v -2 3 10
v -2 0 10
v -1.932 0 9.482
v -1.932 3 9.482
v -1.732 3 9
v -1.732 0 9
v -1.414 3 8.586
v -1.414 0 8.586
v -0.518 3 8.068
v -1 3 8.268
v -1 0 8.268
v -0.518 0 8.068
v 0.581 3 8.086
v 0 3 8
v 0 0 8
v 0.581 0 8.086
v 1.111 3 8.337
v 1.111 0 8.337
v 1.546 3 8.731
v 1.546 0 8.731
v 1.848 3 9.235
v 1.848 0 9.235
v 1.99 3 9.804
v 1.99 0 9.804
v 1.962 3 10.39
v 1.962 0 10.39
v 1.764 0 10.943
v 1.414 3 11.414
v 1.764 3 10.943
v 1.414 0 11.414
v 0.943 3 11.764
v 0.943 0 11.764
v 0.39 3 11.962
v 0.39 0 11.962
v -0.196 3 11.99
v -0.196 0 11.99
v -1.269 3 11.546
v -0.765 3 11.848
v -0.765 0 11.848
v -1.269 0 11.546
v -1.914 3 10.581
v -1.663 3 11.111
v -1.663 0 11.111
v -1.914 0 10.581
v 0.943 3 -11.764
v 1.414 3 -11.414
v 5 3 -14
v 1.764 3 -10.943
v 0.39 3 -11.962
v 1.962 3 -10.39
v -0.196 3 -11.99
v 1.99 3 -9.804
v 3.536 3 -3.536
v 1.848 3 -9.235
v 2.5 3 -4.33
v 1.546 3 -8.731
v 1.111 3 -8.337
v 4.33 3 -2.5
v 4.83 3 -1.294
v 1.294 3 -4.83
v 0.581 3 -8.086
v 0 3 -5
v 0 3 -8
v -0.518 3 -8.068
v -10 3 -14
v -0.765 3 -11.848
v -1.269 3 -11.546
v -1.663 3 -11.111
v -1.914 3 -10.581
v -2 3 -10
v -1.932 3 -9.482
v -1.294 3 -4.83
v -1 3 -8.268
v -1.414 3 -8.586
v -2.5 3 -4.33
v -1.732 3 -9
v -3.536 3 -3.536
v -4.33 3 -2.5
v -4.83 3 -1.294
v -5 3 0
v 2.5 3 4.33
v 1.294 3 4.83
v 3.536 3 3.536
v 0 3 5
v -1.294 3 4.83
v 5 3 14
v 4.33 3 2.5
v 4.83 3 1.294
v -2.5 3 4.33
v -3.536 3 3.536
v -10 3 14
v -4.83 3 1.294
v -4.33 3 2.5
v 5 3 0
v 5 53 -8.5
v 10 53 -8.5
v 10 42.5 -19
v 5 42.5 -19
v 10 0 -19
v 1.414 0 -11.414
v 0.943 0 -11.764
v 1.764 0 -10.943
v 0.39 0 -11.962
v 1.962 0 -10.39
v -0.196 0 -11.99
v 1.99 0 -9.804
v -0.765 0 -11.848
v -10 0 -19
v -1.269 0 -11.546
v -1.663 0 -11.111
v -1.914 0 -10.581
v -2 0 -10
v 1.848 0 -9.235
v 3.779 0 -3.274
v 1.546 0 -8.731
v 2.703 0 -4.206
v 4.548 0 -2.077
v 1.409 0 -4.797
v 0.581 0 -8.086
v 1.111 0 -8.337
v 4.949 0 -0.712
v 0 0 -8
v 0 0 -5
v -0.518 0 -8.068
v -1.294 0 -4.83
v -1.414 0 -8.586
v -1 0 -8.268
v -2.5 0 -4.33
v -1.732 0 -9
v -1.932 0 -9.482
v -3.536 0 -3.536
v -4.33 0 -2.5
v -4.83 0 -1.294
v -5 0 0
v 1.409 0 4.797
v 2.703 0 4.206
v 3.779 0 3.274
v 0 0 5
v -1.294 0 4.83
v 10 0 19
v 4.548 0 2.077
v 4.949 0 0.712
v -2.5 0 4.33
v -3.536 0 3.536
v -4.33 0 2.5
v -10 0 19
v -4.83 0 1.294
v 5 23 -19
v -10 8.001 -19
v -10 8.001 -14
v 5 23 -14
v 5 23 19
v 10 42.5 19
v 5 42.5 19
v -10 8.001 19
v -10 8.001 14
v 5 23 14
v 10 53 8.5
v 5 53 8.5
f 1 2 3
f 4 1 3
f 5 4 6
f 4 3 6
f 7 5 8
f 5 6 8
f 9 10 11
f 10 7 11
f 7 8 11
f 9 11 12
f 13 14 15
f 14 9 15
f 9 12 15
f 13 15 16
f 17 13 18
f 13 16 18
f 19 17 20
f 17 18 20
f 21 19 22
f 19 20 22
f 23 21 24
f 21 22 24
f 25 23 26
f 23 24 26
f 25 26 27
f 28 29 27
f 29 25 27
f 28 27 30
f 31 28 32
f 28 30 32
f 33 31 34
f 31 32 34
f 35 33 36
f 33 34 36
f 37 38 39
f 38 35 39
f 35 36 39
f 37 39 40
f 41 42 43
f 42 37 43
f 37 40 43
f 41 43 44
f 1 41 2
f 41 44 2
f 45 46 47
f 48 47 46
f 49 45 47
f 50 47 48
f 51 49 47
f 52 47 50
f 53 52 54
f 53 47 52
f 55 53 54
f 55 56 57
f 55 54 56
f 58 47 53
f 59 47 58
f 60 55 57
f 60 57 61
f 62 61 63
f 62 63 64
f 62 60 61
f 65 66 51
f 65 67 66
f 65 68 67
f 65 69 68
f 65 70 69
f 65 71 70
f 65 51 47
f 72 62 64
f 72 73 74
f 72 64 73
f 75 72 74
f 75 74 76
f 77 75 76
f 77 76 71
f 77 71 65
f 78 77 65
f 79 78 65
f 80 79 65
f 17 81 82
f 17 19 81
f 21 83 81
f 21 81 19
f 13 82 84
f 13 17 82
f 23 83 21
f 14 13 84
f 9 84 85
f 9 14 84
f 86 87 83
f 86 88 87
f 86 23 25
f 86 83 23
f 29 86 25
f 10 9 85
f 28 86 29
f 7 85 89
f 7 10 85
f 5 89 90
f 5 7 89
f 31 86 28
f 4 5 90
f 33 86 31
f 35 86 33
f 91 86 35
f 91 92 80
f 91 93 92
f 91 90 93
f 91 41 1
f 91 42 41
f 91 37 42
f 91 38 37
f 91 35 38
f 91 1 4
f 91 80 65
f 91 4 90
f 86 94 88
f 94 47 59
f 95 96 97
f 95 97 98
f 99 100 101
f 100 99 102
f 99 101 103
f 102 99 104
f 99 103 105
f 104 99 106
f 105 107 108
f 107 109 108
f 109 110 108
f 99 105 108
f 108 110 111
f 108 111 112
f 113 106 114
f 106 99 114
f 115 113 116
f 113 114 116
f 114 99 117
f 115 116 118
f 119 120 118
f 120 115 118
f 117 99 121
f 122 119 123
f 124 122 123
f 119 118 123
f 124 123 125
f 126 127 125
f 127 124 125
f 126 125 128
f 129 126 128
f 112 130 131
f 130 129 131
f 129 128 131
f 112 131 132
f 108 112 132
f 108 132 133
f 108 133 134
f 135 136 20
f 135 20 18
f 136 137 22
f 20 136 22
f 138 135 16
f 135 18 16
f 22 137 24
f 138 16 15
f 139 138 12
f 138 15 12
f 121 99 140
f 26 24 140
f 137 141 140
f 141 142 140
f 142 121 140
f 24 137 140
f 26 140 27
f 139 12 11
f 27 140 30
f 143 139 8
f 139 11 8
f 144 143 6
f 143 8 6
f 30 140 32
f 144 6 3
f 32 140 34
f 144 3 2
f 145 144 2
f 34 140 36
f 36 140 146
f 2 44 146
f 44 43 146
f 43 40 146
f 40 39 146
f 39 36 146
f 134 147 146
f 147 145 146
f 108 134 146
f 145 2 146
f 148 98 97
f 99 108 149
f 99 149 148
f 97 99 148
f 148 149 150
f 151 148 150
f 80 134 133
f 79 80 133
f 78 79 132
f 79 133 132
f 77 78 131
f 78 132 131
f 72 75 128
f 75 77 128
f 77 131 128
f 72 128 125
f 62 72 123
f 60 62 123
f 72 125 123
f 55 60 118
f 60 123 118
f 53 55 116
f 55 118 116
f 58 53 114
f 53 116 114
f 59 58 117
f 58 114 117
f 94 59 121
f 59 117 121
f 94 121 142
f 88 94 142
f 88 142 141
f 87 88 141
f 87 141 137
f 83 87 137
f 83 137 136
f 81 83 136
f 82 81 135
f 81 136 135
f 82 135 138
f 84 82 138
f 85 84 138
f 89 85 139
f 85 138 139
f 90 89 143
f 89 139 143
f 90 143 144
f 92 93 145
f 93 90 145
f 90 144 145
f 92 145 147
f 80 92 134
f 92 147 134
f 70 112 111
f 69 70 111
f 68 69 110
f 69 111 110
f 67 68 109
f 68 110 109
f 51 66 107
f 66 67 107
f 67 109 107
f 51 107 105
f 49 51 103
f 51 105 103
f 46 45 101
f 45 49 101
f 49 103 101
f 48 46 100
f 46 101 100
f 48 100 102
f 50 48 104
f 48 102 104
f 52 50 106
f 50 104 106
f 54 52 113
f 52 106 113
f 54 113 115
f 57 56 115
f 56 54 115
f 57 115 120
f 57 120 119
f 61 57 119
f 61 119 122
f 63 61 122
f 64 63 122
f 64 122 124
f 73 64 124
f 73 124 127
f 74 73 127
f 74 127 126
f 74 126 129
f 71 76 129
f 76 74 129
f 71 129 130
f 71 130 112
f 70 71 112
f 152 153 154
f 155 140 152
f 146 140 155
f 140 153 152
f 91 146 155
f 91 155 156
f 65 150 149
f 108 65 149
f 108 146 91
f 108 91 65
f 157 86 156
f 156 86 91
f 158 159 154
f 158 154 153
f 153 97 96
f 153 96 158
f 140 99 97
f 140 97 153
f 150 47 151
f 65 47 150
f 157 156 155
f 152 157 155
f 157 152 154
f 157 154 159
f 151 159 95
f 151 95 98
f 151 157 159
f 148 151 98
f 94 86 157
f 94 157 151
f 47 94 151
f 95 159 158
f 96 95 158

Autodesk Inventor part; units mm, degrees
ref_plane "YZ Plane" through (0, 0, 0) normal (1, 0, 0) x (0, 1, 0)
ref_plane "XZ Plane" through (0, 0, 0) normal (0, 1, 0) x (-1, 0, 0)
ref_plane "XY Plane" through (0, 0, 0) normal (0, 0, 1) x (1, 0, 0)
sketch "Эскиз1" plane through (0, 0, 0) normal (0, 1, 0) x (-1, 0, 0)
  line L0 (-10, 19) -> (10, 19)
  line L1 (10, 19) -> (10, -19)
  line L2 (10, -19) -> (-10, -19)
  line L3 (-10, -19) -> (-10, 19)
  line L4 (-10, 19) -> (10, -19) construction
  line L5 (10, 19) -> (-10, -19) construction
  circle A0 centre (0, 0) radius 5
  line L6 (0, 0) -> (0, 10)
  line L7 (0, 10) -> (0, -10)
  circle A1 centre (0, 10) radius 2
  circle A2 centre (0, -10) radius 2
  dimension "d0" = 20
  dimension "d1" = 38
  dimension "d2" = 10
  dimension "d3" = 10
  dimension "d4" = 20
  dimension "d5" = 4
  dimension "d6" = 4
extrude "Выдавливание1" add sketch "Эскиз1" along normal blind 3
sketch "Эскиз2" plane through (0, 3, 0) normal (0, 1, 0) x (1, 0, 0)
  line L0 (-10, -19) -> (10, -19) projected
  line L1 (10, -19) -> (5, -19)
  line L2 (5, -19) -> (5, 19)
  line L3 (5, 19) -> (10, 19)
  line L4 (10, 19) -> (10, -19)
  point P0 (0, 0)
  dimension "d9" = 38
  dimension "d10" = 5
extrude "Выдавливание2" add sketch "Эскиз2" along normal blind 50
chamfer "Фаска1" distance 10.5 angle 45 2 edges at (7.5, 53, -19) (7.5, 53, 19)
sketch "Эскиз3" plane through (0, 3, 0) normal (0, 1, 0) x (1, 0, 0)
  line L0 (-10, 19) -> (10, 19) projected
  line L1 (5, 0) -> (5, 19) projected
  line L2 (-10, 19) -> (5, 19)
  line L3 (5, 19) -> (5, 14)
  line L4 (5, 14) -> (-10, 14)
  line L5 (-10, 14) -> (-10, 19)
  line L6 (10, -19) -> (-10, -19) projected
  line L7 (5, -8.5) -> (5, -19) projected
  line L8 (-10, -19) -> (5, -19)
  line L9 (5, -19) -> (5, -14)
  line L10 (5, -14) -> (-10, -14)
  line L11 (-10, -14) -> (-10, -19)
  point P0 (0, 0)
  dimension "d16" = 5
  dimension "d17" = 5
extrude "Выдавливание3" add sketch "Эскиз3" along normal blind 20
chamfer "Фаска2" distance 15 angle 45 2 edges at (-10, 23, -16.5) (-10, 23, 16.5)
properties part number "МД.001.1005 - Прихват"
